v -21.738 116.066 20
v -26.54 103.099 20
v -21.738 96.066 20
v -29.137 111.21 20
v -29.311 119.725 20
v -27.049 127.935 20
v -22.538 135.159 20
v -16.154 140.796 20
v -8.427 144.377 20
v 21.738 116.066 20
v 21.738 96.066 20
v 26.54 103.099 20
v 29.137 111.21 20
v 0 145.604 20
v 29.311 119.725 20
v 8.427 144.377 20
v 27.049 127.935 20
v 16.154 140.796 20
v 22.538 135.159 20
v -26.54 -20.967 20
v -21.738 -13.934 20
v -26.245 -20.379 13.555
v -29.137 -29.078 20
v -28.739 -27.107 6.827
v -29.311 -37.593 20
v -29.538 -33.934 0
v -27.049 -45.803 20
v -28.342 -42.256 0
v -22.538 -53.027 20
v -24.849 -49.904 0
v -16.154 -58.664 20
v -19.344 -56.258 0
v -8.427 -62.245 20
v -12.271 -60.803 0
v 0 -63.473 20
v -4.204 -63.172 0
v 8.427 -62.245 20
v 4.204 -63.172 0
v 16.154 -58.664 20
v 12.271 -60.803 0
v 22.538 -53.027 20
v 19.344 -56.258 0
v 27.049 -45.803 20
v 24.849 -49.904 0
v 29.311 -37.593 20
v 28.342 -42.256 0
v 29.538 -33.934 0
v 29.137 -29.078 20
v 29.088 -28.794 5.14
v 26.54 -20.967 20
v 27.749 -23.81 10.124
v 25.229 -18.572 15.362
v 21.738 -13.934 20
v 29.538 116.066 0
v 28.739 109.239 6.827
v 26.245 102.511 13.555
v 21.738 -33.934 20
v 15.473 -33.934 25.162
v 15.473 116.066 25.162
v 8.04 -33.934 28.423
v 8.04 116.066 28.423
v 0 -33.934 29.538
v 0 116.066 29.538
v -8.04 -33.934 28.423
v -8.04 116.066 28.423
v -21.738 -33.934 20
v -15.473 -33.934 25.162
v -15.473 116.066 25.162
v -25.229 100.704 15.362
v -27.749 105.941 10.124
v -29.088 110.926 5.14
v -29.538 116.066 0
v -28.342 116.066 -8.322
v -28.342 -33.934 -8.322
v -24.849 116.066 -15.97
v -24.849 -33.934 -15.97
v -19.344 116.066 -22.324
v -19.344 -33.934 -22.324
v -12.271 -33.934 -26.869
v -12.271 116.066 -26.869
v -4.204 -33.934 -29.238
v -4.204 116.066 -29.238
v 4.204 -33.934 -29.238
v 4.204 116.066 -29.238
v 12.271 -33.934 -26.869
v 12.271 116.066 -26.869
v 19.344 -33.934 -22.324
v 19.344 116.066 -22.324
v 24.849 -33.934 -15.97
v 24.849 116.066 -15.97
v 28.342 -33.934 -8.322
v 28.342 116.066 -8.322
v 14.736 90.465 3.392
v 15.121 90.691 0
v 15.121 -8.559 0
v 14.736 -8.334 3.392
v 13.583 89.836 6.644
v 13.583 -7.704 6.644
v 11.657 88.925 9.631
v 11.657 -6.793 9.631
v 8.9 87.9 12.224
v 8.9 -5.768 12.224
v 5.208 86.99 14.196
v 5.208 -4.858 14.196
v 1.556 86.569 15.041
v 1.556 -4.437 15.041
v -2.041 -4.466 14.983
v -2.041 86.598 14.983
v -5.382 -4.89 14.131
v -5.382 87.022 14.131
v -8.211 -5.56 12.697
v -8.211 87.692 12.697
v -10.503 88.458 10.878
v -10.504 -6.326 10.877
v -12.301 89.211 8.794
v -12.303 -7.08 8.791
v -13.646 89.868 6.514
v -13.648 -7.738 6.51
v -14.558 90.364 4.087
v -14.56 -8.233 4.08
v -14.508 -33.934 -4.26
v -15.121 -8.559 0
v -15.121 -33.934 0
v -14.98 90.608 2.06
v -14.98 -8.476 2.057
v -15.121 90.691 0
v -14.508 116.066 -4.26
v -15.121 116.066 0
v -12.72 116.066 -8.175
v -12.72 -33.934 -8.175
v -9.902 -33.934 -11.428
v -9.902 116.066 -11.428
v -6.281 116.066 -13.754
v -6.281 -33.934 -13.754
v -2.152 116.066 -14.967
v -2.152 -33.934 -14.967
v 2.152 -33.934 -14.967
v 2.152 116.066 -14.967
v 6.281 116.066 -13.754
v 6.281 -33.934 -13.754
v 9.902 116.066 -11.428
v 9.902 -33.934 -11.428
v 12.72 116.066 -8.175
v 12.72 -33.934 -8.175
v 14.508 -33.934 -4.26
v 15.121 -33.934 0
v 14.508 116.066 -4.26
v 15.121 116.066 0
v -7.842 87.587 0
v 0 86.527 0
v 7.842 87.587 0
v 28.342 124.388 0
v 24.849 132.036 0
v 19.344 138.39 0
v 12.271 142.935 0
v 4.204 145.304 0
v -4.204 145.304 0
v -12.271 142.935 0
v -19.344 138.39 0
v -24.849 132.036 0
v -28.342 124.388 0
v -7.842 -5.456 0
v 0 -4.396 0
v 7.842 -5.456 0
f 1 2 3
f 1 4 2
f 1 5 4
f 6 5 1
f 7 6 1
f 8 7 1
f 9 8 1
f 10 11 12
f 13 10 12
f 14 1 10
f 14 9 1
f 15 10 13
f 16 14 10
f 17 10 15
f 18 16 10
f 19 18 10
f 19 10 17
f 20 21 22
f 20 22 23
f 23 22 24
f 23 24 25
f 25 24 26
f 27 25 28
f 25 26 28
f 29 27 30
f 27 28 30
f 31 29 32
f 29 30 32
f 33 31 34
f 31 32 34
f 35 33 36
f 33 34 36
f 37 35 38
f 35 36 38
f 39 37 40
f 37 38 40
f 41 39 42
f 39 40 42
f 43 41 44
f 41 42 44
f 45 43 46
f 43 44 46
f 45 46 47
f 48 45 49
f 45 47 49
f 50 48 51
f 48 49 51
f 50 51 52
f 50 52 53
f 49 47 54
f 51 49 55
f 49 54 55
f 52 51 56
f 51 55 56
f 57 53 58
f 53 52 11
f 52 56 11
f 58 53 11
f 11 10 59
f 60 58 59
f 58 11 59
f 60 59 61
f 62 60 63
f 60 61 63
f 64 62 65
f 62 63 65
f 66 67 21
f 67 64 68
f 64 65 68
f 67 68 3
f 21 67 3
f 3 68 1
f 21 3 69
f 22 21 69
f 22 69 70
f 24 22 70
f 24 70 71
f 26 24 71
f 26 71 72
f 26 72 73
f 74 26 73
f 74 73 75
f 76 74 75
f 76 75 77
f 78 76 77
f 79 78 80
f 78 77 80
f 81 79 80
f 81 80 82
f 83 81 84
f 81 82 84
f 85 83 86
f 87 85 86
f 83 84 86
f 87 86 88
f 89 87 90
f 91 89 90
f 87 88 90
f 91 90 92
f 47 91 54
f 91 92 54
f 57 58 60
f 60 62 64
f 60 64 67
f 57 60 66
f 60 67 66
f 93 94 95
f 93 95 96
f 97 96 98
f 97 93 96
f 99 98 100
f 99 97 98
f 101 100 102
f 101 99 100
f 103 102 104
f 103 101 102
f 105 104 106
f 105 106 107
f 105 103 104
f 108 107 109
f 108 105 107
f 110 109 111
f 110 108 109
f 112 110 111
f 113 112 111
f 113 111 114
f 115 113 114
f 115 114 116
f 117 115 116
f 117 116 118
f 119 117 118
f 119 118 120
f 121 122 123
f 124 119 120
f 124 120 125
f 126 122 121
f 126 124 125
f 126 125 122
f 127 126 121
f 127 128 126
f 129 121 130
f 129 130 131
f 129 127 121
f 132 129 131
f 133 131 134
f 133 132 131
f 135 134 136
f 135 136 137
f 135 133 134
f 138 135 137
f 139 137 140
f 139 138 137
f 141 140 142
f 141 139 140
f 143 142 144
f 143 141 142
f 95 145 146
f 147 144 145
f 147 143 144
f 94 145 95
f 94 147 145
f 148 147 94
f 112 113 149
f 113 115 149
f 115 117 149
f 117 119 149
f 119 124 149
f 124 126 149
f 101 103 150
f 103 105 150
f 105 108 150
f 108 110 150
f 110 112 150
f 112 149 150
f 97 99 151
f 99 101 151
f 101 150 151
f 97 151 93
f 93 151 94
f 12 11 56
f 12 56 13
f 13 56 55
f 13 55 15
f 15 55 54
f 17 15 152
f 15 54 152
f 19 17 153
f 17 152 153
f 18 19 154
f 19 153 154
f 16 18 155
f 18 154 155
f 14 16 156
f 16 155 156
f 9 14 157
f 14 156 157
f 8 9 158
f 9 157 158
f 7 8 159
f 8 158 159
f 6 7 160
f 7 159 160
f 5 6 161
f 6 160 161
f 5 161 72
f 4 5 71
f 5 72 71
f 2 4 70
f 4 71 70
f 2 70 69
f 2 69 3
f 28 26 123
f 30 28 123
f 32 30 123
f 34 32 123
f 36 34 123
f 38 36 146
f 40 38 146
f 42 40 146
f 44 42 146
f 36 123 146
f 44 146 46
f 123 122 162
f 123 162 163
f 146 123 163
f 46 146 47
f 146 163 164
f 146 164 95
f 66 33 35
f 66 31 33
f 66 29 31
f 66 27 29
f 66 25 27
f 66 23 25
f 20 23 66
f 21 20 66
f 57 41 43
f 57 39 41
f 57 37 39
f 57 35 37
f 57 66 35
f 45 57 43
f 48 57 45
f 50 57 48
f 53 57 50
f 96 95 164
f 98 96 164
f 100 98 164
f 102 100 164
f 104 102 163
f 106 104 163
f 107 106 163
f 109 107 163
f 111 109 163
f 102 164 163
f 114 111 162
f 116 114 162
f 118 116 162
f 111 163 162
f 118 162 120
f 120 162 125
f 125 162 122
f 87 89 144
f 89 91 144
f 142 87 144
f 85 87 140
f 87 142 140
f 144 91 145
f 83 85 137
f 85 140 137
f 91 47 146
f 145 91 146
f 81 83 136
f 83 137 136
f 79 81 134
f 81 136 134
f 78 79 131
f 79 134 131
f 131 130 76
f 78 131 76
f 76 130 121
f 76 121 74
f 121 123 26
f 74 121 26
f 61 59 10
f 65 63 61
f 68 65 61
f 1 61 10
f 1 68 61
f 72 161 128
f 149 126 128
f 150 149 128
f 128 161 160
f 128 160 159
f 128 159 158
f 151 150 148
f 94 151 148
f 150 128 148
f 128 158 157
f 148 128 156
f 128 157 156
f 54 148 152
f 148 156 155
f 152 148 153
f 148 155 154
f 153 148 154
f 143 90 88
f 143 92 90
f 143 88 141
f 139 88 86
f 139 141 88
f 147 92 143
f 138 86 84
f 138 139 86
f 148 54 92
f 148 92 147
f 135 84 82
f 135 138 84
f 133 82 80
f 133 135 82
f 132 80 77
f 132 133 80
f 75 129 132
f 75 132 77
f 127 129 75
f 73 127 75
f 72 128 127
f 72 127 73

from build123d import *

# Parameters (mm, degrees)
SKETCH1_W           = 14.417582417
SKETCH1_H           = 150
SKETCH2_R           = 29.538461538
BOSS_EXTRUDE1_DEPTH = 20


with BuildPart() as part:
    # Sketch1 → Revolve1 (revolve)
    with BuildSketch(Plane.XY):
        with Locations((22.32967033, 41.065934066)):
            Rectangle(SKETCH1_W, SKETCH1_H)
    revolve(axis=Axis((0, 46.065934066, 0), (0, -1, 0)))

    # Sketch2 → Boss-Extrude1 (add)
    with BuildSketch(Plane.XY):
        with Locations((0, 116.065934066)):
            Circle(SKETCH2_R)
        with Locations((0, -33.934065934)):
            Circle(SKETCH2_R)
    extrude(amount=BOSS_EXTRUDE1_DEPTH)


solid = part.part
